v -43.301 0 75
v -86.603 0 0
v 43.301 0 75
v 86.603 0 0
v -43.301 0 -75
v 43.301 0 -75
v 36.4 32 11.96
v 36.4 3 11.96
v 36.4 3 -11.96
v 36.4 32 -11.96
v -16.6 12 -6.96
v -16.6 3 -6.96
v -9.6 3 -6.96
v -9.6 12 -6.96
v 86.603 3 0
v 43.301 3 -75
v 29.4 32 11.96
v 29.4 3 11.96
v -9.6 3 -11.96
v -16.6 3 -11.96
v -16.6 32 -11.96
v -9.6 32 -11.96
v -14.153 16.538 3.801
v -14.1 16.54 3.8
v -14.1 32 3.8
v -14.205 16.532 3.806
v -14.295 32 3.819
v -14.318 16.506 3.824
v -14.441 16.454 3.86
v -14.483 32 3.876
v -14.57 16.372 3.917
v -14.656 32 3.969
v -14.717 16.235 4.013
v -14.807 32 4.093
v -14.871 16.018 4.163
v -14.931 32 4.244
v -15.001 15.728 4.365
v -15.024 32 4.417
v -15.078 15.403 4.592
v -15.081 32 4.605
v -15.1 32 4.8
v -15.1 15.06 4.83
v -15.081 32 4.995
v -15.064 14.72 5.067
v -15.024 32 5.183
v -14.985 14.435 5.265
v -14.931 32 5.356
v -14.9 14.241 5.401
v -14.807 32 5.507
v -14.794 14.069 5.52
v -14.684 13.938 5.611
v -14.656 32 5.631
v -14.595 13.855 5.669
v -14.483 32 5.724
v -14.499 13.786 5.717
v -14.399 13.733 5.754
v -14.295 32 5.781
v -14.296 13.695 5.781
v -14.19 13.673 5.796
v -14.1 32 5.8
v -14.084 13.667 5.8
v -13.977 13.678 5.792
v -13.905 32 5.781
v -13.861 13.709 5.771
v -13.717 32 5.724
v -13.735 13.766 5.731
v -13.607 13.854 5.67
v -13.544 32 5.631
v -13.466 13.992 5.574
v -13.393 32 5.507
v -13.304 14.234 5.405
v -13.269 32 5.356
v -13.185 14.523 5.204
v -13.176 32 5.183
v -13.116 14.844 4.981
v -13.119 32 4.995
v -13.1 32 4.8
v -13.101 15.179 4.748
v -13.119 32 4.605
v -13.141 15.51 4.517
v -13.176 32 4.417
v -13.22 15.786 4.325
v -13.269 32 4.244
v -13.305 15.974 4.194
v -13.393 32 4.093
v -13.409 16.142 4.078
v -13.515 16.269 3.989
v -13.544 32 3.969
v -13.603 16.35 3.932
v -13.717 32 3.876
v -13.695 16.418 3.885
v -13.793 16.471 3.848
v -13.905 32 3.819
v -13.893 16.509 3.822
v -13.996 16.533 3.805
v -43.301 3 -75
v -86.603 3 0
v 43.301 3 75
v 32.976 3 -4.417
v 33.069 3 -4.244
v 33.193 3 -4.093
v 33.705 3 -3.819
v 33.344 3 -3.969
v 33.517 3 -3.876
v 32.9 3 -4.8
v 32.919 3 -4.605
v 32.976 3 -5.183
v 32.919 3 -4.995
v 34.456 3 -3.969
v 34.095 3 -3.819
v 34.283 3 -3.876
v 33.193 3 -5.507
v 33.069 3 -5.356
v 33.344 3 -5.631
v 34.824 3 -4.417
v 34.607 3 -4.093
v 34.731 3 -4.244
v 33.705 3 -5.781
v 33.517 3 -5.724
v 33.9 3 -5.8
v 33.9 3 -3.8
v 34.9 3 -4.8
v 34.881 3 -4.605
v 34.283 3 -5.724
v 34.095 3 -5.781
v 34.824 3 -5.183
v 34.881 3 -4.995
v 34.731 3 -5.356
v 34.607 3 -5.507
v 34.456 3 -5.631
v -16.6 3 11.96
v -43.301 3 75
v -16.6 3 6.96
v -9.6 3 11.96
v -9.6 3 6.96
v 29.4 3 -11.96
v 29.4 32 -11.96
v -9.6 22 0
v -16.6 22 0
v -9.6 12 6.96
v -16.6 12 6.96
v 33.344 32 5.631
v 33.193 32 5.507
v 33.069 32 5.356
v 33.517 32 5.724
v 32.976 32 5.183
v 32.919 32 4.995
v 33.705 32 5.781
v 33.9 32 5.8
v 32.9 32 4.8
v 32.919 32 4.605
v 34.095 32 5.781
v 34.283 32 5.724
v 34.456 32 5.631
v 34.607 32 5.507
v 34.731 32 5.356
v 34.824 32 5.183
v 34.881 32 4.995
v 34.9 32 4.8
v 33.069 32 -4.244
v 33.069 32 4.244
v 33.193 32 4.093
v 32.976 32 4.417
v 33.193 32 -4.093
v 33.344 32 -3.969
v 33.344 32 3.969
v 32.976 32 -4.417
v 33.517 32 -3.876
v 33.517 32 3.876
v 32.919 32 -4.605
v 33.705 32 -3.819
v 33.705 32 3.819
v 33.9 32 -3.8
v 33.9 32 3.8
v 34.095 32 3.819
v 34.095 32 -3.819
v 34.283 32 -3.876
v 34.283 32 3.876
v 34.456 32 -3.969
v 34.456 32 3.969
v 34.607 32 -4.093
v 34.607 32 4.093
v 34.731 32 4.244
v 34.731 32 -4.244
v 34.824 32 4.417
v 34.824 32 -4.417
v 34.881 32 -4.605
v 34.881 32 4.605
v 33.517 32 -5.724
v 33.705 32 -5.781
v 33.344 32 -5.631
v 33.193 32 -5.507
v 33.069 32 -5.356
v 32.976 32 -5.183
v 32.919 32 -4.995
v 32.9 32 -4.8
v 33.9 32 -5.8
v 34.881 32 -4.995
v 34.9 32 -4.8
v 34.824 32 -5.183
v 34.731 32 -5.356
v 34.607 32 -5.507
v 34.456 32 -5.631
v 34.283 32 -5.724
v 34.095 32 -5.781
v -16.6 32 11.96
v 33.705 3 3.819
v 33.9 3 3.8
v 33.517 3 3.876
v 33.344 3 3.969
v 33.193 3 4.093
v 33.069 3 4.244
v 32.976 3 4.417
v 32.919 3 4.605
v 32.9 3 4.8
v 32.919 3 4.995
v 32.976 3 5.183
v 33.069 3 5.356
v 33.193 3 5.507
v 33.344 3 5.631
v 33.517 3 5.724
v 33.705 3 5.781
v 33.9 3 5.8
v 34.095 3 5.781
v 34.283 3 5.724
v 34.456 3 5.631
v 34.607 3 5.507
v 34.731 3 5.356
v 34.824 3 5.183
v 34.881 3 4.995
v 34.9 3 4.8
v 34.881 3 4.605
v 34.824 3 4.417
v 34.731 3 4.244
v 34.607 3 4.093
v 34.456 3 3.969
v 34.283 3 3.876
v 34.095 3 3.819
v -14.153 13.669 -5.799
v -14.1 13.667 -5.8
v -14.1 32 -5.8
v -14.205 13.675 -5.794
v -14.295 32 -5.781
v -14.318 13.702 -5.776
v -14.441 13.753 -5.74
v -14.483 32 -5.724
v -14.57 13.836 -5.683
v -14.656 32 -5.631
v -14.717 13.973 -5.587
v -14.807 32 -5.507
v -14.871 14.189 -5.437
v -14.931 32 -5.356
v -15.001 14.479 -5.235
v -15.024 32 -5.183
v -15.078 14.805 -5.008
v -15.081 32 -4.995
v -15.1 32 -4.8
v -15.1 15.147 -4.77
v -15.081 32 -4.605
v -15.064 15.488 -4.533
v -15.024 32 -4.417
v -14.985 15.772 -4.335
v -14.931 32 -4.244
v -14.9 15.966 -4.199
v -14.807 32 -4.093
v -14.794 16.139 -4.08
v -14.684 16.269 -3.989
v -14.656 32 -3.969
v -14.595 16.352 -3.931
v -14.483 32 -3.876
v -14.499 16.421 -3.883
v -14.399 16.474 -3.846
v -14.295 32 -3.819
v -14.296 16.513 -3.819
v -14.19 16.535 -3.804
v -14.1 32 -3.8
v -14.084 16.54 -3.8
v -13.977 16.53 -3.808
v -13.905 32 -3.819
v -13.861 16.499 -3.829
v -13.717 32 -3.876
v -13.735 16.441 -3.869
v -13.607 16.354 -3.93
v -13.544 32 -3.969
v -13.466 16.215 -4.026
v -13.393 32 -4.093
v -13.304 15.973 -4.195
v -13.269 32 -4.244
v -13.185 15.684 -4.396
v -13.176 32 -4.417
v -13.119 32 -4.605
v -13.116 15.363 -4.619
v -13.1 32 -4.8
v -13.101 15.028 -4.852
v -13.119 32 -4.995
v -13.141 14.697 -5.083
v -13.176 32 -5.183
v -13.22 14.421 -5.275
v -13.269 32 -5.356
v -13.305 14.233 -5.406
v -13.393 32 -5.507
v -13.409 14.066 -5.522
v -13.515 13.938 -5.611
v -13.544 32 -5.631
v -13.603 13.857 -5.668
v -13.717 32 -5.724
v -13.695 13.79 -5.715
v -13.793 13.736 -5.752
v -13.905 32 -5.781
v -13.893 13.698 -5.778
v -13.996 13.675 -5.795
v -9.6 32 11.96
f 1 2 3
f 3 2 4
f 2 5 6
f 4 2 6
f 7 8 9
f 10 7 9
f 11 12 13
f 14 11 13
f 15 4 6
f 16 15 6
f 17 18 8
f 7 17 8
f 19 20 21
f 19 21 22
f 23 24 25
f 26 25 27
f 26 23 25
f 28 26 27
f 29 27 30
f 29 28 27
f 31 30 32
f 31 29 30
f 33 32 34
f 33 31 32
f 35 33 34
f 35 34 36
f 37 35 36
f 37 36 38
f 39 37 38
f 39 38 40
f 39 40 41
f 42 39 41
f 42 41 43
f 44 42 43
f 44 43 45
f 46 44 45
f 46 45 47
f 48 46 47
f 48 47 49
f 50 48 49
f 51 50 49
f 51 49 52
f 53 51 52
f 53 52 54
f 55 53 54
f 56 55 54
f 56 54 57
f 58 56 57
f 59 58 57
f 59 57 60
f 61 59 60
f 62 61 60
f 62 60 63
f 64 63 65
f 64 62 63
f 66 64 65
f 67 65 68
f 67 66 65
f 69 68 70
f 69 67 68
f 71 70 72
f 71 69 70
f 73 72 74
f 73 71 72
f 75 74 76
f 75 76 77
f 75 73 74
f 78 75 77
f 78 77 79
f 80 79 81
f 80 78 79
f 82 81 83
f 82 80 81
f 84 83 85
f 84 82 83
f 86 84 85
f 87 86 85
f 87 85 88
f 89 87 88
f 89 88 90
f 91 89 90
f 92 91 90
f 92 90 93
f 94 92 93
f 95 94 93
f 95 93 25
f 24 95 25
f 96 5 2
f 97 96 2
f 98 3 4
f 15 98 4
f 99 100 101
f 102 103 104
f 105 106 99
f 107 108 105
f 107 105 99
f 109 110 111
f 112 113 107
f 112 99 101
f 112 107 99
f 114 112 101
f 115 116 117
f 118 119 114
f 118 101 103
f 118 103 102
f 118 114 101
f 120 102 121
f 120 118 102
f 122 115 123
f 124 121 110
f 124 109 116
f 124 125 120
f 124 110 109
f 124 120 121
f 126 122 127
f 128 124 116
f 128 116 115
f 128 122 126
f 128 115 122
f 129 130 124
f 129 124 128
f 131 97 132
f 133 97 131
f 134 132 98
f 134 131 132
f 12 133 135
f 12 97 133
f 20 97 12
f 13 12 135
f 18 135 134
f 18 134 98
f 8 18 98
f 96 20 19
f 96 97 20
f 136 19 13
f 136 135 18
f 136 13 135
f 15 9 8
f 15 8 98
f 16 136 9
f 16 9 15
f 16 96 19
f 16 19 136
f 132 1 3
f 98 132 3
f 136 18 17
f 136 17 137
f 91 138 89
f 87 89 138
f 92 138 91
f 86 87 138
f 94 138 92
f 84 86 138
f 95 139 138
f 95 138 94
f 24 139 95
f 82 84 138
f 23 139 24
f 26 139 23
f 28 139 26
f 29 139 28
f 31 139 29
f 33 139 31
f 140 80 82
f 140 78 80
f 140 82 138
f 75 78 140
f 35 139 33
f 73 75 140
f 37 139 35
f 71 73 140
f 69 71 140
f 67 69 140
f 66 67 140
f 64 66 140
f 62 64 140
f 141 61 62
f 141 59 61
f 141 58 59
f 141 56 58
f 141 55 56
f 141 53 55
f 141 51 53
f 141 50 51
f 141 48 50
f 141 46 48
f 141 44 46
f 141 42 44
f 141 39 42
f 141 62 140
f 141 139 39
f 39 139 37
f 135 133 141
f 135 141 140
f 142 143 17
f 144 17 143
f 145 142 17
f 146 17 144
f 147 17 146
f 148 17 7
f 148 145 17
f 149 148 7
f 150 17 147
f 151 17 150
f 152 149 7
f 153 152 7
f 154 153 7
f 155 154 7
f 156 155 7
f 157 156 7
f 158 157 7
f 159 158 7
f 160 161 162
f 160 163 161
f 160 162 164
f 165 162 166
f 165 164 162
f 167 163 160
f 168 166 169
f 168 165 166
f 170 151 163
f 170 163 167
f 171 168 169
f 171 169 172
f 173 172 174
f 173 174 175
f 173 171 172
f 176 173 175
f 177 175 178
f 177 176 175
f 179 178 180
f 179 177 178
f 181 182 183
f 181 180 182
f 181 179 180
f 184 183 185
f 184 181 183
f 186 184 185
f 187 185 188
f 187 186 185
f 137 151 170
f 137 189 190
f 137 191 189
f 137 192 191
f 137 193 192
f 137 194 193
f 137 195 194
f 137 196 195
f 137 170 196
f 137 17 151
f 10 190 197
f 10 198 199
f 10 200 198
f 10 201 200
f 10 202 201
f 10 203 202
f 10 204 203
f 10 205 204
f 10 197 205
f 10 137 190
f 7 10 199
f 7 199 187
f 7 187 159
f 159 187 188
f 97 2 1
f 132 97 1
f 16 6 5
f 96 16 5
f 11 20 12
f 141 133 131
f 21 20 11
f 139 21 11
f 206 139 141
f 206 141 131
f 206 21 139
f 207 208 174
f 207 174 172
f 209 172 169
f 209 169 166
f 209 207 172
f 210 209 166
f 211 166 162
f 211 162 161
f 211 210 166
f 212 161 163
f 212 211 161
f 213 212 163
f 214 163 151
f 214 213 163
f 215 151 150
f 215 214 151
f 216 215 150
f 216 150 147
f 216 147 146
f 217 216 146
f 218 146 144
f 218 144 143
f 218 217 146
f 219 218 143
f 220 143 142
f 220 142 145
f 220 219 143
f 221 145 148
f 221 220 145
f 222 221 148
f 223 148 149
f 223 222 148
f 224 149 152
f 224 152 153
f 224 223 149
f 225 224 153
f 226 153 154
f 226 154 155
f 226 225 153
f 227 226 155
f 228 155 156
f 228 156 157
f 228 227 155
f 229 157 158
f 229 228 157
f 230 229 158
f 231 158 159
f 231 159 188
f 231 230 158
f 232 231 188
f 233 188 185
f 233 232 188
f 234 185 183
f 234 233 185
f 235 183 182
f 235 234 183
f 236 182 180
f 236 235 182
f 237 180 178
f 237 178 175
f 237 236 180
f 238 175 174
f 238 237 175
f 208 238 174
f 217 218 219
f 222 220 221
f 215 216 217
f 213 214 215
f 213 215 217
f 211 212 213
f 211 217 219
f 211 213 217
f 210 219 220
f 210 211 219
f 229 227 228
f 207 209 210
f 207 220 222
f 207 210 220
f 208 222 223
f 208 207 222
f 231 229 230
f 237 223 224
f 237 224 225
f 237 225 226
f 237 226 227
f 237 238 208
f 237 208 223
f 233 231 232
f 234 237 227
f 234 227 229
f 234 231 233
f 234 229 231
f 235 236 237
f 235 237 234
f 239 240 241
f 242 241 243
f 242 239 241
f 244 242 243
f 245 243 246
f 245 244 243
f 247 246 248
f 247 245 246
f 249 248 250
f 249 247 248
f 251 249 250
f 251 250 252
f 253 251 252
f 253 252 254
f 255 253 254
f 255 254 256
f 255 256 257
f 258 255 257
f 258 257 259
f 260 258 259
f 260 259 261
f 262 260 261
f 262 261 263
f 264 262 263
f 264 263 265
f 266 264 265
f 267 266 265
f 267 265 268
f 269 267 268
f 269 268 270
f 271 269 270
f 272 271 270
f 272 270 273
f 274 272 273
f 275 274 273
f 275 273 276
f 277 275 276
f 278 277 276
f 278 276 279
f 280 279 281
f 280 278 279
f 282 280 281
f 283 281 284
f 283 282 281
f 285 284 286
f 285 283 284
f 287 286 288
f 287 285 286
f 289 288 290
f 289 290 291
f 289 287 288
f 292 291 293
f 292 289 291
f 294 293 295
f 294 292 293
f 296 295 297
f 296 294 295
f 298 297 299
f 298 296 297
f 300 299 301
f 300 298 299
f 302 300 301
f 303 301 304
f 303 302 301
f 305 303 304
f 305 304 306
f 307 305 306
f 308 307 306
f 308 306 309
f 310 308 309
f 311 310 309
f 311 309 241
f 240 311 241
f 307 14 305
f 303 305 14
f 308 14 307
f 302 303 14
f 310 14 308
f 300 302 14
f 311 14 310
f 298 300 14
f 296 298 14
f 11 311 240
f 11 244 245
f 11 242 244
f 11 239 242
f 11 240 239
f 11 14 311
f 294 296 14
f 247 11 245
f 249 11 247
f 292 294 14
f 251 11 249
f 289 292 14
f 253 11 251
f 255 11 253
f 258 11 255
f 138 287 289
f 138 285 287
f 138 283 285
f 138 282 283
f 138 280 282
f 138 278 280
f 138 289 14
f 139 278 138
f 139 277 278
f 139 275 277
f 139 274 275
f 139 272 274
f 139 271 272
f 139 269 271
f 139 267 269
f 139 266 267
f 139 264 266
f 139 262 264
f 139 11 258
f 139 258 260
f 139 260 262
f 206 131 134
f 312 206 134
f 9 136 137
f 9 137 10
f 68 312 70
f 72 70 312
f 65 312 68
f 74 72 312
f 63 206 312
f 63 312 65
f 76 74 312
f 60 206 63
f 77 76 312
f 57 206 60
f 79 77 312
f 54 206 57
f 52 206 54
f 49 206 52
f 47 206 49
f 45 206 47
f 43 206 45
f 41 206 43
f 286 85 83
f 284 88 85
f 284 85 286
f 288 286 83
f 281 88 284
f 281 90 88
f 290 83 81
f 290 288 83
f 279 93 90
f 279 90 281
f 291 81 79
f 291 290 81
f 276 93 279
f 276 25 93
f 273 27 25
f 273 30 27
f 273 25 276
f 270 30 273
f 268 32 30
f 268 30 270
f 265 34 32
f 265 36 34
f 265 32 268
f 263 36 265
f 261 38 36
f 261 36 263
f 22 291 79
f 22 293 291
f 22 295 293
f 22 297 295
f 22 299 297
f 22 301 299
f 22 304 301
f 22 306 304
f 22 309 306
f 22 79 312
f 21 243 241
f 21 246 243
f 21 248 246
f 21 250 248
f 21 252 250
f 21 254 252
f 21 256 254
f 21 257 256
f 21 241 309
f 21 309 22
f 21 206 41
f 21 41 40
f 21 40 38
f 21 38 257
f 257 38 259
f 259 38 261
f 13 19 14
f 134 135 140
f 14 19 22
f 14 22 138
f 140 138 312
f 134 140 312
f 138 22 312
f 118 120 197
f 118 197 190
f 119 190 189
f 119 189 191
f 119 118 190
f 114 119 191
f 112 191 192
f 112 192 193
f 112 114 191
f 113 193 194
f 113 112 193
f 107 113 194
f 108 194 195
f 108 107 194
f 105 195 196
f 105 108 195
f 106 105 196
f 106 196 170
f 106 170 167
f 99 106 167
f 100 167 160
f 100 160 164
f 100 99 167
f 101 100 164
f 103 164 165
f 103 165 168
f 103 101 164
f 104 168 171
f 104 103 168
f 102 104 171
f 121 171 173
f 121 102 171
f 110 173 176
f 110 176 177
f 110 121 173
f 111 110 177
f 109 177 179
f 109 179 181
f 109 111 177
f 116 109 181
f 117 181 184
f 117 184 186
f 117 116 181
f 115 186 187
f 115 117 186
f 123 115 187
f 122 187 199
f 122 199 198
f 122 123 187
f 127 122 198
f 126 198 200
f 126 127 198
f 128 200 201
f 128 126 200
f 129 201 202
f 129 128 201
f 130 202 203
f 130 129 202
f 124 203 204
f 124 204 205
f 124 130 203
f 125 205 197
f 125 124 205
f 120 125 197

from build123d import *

# Parameters (mm, degrees)
BOSS_EXTRUDE1_DEPTH = 3
SKETCH2_R           = 1
SKETCH2_W           = 7
SKETCH2_H           = 23.92041254
SKETCH2_H_2         = 5
BOSS_EXTRUDE4_DEPTH = 29
BOSS_EXTRUDE5_DEPTH = 7
SKETCH2_4_R         = 1
CUT_EXTRUDE1_DEPTH  = 29


with BuildPart() as part:
    # Sketch1 → Boss-Extrude1 (new body)
    with BuildSketch(Plane(origin=(0, 0, 0), x_dir=(1, 0, 0), z_dir=(0, 1, 0))):
        Polygon((86.602540378, 0), (43.301270189, 75), (-43.301270189, 75), (-86.602540378, 0), (-43.301270189, -75), (43.301270189, -75), align=None)
    extrude(amount=BOSS_EXTRUDE1_DEPTH)

    # Sketch2 → Boss-Extrude4 (add)
    # profile 1 of 5: a face of its own
    with BuildSketch(Plane(origin=(0, 3, 0), x_dir=(1, 0, 0), z_dir=(0, 1, 0))):
        with Locations(Location((-14.1, -4.8, 0), (0, 0, 90))):
            Circle(SKETCH2_R)
    # profile 2 of 5: a face of its own
    with BuildSketch(Plane(origin=(0, 3, 0), x_dir=(1, 0, 0), z_dir=(0, 1, 0))):
        with Locations(Location((-14.1, 4.8, 0), (0, 0, 90))):
            Circle(SKETCH2_R)
    # profile 3 of 5: a face of its own
    with BuildSketch(Plane(origin=(0, 3, 0), x_dir=(1, 0, 0), z_dir=(0, 1, 0))):
        with Locations((32.9, 0)):
            Rectangle(SKETCH2_W, SKETCH2_H)
        with Locations(Location((33.9, -4.8, 0), (0, 0, 90))):
            Circle(SKETCH2_R, mode=Mode.SUBTRACT)
        with Locations(Location((33.9, 4.8, 0), (0, 0, 90))):
            Circle(SKETCH2_R, mode=Mode.SUBTRACT)
    # profile 4 of 5: a face of its own
    with BuildSketch(Plane(origin=(0, 3, 0), x_dir=(1, 0, 0), z_dir=(0, 1, 0))):
        with Locations((-13.1, 9.46020627)):
            Rectangle(SKETCH2_W, SKETCH2_H_2)
    # profile 5 of 5: a face of its own
    with BuildSketch(Plane(origin=(0, 3, 0), x_dir=(1, 0, 0), z_dir=(0, 1, 0))):
        with Locations((-13.1, -9.46020627)):
            Rectangle(SKETCH2_W, SKETCH2_H_2)
    extrude(amount=BOSS_EXTRUDE4_DEPTH)

    # Sketch4 → Boss-Extrude5 (add)
    with BuildSketch(Plane.ZY.offset(16.6)):
        Polygon((-6.96020627, 12), (0, 22), (6.96020627, 12), (6.96020627, 32), (-6.96020627, 32), align=None)
    extrude(amount=-BOSS_EXTRUDE5_DEPTH)

    # Sketch2<4> → Cut-Extrude1 (cut)
    with BuildSketch(Plane(origin=(0, 3, 0), x_dir=(1, 0, 0), z_dir=(0, 1, 0))):
        with Locations(Location((-14.1, -4.8, 0), (0, 0, 90))):
            Circle(SKETCH2_4_R)
        with Locations(Location((-14.1, 4.8, 0), (0, 0, 90))):
            Circle(SKETCH2_4_R)
    extrude(amount=CUT_EXTRUDE1_DEPTH, mode=Mode.SUBTRACT)


solid = part.part
